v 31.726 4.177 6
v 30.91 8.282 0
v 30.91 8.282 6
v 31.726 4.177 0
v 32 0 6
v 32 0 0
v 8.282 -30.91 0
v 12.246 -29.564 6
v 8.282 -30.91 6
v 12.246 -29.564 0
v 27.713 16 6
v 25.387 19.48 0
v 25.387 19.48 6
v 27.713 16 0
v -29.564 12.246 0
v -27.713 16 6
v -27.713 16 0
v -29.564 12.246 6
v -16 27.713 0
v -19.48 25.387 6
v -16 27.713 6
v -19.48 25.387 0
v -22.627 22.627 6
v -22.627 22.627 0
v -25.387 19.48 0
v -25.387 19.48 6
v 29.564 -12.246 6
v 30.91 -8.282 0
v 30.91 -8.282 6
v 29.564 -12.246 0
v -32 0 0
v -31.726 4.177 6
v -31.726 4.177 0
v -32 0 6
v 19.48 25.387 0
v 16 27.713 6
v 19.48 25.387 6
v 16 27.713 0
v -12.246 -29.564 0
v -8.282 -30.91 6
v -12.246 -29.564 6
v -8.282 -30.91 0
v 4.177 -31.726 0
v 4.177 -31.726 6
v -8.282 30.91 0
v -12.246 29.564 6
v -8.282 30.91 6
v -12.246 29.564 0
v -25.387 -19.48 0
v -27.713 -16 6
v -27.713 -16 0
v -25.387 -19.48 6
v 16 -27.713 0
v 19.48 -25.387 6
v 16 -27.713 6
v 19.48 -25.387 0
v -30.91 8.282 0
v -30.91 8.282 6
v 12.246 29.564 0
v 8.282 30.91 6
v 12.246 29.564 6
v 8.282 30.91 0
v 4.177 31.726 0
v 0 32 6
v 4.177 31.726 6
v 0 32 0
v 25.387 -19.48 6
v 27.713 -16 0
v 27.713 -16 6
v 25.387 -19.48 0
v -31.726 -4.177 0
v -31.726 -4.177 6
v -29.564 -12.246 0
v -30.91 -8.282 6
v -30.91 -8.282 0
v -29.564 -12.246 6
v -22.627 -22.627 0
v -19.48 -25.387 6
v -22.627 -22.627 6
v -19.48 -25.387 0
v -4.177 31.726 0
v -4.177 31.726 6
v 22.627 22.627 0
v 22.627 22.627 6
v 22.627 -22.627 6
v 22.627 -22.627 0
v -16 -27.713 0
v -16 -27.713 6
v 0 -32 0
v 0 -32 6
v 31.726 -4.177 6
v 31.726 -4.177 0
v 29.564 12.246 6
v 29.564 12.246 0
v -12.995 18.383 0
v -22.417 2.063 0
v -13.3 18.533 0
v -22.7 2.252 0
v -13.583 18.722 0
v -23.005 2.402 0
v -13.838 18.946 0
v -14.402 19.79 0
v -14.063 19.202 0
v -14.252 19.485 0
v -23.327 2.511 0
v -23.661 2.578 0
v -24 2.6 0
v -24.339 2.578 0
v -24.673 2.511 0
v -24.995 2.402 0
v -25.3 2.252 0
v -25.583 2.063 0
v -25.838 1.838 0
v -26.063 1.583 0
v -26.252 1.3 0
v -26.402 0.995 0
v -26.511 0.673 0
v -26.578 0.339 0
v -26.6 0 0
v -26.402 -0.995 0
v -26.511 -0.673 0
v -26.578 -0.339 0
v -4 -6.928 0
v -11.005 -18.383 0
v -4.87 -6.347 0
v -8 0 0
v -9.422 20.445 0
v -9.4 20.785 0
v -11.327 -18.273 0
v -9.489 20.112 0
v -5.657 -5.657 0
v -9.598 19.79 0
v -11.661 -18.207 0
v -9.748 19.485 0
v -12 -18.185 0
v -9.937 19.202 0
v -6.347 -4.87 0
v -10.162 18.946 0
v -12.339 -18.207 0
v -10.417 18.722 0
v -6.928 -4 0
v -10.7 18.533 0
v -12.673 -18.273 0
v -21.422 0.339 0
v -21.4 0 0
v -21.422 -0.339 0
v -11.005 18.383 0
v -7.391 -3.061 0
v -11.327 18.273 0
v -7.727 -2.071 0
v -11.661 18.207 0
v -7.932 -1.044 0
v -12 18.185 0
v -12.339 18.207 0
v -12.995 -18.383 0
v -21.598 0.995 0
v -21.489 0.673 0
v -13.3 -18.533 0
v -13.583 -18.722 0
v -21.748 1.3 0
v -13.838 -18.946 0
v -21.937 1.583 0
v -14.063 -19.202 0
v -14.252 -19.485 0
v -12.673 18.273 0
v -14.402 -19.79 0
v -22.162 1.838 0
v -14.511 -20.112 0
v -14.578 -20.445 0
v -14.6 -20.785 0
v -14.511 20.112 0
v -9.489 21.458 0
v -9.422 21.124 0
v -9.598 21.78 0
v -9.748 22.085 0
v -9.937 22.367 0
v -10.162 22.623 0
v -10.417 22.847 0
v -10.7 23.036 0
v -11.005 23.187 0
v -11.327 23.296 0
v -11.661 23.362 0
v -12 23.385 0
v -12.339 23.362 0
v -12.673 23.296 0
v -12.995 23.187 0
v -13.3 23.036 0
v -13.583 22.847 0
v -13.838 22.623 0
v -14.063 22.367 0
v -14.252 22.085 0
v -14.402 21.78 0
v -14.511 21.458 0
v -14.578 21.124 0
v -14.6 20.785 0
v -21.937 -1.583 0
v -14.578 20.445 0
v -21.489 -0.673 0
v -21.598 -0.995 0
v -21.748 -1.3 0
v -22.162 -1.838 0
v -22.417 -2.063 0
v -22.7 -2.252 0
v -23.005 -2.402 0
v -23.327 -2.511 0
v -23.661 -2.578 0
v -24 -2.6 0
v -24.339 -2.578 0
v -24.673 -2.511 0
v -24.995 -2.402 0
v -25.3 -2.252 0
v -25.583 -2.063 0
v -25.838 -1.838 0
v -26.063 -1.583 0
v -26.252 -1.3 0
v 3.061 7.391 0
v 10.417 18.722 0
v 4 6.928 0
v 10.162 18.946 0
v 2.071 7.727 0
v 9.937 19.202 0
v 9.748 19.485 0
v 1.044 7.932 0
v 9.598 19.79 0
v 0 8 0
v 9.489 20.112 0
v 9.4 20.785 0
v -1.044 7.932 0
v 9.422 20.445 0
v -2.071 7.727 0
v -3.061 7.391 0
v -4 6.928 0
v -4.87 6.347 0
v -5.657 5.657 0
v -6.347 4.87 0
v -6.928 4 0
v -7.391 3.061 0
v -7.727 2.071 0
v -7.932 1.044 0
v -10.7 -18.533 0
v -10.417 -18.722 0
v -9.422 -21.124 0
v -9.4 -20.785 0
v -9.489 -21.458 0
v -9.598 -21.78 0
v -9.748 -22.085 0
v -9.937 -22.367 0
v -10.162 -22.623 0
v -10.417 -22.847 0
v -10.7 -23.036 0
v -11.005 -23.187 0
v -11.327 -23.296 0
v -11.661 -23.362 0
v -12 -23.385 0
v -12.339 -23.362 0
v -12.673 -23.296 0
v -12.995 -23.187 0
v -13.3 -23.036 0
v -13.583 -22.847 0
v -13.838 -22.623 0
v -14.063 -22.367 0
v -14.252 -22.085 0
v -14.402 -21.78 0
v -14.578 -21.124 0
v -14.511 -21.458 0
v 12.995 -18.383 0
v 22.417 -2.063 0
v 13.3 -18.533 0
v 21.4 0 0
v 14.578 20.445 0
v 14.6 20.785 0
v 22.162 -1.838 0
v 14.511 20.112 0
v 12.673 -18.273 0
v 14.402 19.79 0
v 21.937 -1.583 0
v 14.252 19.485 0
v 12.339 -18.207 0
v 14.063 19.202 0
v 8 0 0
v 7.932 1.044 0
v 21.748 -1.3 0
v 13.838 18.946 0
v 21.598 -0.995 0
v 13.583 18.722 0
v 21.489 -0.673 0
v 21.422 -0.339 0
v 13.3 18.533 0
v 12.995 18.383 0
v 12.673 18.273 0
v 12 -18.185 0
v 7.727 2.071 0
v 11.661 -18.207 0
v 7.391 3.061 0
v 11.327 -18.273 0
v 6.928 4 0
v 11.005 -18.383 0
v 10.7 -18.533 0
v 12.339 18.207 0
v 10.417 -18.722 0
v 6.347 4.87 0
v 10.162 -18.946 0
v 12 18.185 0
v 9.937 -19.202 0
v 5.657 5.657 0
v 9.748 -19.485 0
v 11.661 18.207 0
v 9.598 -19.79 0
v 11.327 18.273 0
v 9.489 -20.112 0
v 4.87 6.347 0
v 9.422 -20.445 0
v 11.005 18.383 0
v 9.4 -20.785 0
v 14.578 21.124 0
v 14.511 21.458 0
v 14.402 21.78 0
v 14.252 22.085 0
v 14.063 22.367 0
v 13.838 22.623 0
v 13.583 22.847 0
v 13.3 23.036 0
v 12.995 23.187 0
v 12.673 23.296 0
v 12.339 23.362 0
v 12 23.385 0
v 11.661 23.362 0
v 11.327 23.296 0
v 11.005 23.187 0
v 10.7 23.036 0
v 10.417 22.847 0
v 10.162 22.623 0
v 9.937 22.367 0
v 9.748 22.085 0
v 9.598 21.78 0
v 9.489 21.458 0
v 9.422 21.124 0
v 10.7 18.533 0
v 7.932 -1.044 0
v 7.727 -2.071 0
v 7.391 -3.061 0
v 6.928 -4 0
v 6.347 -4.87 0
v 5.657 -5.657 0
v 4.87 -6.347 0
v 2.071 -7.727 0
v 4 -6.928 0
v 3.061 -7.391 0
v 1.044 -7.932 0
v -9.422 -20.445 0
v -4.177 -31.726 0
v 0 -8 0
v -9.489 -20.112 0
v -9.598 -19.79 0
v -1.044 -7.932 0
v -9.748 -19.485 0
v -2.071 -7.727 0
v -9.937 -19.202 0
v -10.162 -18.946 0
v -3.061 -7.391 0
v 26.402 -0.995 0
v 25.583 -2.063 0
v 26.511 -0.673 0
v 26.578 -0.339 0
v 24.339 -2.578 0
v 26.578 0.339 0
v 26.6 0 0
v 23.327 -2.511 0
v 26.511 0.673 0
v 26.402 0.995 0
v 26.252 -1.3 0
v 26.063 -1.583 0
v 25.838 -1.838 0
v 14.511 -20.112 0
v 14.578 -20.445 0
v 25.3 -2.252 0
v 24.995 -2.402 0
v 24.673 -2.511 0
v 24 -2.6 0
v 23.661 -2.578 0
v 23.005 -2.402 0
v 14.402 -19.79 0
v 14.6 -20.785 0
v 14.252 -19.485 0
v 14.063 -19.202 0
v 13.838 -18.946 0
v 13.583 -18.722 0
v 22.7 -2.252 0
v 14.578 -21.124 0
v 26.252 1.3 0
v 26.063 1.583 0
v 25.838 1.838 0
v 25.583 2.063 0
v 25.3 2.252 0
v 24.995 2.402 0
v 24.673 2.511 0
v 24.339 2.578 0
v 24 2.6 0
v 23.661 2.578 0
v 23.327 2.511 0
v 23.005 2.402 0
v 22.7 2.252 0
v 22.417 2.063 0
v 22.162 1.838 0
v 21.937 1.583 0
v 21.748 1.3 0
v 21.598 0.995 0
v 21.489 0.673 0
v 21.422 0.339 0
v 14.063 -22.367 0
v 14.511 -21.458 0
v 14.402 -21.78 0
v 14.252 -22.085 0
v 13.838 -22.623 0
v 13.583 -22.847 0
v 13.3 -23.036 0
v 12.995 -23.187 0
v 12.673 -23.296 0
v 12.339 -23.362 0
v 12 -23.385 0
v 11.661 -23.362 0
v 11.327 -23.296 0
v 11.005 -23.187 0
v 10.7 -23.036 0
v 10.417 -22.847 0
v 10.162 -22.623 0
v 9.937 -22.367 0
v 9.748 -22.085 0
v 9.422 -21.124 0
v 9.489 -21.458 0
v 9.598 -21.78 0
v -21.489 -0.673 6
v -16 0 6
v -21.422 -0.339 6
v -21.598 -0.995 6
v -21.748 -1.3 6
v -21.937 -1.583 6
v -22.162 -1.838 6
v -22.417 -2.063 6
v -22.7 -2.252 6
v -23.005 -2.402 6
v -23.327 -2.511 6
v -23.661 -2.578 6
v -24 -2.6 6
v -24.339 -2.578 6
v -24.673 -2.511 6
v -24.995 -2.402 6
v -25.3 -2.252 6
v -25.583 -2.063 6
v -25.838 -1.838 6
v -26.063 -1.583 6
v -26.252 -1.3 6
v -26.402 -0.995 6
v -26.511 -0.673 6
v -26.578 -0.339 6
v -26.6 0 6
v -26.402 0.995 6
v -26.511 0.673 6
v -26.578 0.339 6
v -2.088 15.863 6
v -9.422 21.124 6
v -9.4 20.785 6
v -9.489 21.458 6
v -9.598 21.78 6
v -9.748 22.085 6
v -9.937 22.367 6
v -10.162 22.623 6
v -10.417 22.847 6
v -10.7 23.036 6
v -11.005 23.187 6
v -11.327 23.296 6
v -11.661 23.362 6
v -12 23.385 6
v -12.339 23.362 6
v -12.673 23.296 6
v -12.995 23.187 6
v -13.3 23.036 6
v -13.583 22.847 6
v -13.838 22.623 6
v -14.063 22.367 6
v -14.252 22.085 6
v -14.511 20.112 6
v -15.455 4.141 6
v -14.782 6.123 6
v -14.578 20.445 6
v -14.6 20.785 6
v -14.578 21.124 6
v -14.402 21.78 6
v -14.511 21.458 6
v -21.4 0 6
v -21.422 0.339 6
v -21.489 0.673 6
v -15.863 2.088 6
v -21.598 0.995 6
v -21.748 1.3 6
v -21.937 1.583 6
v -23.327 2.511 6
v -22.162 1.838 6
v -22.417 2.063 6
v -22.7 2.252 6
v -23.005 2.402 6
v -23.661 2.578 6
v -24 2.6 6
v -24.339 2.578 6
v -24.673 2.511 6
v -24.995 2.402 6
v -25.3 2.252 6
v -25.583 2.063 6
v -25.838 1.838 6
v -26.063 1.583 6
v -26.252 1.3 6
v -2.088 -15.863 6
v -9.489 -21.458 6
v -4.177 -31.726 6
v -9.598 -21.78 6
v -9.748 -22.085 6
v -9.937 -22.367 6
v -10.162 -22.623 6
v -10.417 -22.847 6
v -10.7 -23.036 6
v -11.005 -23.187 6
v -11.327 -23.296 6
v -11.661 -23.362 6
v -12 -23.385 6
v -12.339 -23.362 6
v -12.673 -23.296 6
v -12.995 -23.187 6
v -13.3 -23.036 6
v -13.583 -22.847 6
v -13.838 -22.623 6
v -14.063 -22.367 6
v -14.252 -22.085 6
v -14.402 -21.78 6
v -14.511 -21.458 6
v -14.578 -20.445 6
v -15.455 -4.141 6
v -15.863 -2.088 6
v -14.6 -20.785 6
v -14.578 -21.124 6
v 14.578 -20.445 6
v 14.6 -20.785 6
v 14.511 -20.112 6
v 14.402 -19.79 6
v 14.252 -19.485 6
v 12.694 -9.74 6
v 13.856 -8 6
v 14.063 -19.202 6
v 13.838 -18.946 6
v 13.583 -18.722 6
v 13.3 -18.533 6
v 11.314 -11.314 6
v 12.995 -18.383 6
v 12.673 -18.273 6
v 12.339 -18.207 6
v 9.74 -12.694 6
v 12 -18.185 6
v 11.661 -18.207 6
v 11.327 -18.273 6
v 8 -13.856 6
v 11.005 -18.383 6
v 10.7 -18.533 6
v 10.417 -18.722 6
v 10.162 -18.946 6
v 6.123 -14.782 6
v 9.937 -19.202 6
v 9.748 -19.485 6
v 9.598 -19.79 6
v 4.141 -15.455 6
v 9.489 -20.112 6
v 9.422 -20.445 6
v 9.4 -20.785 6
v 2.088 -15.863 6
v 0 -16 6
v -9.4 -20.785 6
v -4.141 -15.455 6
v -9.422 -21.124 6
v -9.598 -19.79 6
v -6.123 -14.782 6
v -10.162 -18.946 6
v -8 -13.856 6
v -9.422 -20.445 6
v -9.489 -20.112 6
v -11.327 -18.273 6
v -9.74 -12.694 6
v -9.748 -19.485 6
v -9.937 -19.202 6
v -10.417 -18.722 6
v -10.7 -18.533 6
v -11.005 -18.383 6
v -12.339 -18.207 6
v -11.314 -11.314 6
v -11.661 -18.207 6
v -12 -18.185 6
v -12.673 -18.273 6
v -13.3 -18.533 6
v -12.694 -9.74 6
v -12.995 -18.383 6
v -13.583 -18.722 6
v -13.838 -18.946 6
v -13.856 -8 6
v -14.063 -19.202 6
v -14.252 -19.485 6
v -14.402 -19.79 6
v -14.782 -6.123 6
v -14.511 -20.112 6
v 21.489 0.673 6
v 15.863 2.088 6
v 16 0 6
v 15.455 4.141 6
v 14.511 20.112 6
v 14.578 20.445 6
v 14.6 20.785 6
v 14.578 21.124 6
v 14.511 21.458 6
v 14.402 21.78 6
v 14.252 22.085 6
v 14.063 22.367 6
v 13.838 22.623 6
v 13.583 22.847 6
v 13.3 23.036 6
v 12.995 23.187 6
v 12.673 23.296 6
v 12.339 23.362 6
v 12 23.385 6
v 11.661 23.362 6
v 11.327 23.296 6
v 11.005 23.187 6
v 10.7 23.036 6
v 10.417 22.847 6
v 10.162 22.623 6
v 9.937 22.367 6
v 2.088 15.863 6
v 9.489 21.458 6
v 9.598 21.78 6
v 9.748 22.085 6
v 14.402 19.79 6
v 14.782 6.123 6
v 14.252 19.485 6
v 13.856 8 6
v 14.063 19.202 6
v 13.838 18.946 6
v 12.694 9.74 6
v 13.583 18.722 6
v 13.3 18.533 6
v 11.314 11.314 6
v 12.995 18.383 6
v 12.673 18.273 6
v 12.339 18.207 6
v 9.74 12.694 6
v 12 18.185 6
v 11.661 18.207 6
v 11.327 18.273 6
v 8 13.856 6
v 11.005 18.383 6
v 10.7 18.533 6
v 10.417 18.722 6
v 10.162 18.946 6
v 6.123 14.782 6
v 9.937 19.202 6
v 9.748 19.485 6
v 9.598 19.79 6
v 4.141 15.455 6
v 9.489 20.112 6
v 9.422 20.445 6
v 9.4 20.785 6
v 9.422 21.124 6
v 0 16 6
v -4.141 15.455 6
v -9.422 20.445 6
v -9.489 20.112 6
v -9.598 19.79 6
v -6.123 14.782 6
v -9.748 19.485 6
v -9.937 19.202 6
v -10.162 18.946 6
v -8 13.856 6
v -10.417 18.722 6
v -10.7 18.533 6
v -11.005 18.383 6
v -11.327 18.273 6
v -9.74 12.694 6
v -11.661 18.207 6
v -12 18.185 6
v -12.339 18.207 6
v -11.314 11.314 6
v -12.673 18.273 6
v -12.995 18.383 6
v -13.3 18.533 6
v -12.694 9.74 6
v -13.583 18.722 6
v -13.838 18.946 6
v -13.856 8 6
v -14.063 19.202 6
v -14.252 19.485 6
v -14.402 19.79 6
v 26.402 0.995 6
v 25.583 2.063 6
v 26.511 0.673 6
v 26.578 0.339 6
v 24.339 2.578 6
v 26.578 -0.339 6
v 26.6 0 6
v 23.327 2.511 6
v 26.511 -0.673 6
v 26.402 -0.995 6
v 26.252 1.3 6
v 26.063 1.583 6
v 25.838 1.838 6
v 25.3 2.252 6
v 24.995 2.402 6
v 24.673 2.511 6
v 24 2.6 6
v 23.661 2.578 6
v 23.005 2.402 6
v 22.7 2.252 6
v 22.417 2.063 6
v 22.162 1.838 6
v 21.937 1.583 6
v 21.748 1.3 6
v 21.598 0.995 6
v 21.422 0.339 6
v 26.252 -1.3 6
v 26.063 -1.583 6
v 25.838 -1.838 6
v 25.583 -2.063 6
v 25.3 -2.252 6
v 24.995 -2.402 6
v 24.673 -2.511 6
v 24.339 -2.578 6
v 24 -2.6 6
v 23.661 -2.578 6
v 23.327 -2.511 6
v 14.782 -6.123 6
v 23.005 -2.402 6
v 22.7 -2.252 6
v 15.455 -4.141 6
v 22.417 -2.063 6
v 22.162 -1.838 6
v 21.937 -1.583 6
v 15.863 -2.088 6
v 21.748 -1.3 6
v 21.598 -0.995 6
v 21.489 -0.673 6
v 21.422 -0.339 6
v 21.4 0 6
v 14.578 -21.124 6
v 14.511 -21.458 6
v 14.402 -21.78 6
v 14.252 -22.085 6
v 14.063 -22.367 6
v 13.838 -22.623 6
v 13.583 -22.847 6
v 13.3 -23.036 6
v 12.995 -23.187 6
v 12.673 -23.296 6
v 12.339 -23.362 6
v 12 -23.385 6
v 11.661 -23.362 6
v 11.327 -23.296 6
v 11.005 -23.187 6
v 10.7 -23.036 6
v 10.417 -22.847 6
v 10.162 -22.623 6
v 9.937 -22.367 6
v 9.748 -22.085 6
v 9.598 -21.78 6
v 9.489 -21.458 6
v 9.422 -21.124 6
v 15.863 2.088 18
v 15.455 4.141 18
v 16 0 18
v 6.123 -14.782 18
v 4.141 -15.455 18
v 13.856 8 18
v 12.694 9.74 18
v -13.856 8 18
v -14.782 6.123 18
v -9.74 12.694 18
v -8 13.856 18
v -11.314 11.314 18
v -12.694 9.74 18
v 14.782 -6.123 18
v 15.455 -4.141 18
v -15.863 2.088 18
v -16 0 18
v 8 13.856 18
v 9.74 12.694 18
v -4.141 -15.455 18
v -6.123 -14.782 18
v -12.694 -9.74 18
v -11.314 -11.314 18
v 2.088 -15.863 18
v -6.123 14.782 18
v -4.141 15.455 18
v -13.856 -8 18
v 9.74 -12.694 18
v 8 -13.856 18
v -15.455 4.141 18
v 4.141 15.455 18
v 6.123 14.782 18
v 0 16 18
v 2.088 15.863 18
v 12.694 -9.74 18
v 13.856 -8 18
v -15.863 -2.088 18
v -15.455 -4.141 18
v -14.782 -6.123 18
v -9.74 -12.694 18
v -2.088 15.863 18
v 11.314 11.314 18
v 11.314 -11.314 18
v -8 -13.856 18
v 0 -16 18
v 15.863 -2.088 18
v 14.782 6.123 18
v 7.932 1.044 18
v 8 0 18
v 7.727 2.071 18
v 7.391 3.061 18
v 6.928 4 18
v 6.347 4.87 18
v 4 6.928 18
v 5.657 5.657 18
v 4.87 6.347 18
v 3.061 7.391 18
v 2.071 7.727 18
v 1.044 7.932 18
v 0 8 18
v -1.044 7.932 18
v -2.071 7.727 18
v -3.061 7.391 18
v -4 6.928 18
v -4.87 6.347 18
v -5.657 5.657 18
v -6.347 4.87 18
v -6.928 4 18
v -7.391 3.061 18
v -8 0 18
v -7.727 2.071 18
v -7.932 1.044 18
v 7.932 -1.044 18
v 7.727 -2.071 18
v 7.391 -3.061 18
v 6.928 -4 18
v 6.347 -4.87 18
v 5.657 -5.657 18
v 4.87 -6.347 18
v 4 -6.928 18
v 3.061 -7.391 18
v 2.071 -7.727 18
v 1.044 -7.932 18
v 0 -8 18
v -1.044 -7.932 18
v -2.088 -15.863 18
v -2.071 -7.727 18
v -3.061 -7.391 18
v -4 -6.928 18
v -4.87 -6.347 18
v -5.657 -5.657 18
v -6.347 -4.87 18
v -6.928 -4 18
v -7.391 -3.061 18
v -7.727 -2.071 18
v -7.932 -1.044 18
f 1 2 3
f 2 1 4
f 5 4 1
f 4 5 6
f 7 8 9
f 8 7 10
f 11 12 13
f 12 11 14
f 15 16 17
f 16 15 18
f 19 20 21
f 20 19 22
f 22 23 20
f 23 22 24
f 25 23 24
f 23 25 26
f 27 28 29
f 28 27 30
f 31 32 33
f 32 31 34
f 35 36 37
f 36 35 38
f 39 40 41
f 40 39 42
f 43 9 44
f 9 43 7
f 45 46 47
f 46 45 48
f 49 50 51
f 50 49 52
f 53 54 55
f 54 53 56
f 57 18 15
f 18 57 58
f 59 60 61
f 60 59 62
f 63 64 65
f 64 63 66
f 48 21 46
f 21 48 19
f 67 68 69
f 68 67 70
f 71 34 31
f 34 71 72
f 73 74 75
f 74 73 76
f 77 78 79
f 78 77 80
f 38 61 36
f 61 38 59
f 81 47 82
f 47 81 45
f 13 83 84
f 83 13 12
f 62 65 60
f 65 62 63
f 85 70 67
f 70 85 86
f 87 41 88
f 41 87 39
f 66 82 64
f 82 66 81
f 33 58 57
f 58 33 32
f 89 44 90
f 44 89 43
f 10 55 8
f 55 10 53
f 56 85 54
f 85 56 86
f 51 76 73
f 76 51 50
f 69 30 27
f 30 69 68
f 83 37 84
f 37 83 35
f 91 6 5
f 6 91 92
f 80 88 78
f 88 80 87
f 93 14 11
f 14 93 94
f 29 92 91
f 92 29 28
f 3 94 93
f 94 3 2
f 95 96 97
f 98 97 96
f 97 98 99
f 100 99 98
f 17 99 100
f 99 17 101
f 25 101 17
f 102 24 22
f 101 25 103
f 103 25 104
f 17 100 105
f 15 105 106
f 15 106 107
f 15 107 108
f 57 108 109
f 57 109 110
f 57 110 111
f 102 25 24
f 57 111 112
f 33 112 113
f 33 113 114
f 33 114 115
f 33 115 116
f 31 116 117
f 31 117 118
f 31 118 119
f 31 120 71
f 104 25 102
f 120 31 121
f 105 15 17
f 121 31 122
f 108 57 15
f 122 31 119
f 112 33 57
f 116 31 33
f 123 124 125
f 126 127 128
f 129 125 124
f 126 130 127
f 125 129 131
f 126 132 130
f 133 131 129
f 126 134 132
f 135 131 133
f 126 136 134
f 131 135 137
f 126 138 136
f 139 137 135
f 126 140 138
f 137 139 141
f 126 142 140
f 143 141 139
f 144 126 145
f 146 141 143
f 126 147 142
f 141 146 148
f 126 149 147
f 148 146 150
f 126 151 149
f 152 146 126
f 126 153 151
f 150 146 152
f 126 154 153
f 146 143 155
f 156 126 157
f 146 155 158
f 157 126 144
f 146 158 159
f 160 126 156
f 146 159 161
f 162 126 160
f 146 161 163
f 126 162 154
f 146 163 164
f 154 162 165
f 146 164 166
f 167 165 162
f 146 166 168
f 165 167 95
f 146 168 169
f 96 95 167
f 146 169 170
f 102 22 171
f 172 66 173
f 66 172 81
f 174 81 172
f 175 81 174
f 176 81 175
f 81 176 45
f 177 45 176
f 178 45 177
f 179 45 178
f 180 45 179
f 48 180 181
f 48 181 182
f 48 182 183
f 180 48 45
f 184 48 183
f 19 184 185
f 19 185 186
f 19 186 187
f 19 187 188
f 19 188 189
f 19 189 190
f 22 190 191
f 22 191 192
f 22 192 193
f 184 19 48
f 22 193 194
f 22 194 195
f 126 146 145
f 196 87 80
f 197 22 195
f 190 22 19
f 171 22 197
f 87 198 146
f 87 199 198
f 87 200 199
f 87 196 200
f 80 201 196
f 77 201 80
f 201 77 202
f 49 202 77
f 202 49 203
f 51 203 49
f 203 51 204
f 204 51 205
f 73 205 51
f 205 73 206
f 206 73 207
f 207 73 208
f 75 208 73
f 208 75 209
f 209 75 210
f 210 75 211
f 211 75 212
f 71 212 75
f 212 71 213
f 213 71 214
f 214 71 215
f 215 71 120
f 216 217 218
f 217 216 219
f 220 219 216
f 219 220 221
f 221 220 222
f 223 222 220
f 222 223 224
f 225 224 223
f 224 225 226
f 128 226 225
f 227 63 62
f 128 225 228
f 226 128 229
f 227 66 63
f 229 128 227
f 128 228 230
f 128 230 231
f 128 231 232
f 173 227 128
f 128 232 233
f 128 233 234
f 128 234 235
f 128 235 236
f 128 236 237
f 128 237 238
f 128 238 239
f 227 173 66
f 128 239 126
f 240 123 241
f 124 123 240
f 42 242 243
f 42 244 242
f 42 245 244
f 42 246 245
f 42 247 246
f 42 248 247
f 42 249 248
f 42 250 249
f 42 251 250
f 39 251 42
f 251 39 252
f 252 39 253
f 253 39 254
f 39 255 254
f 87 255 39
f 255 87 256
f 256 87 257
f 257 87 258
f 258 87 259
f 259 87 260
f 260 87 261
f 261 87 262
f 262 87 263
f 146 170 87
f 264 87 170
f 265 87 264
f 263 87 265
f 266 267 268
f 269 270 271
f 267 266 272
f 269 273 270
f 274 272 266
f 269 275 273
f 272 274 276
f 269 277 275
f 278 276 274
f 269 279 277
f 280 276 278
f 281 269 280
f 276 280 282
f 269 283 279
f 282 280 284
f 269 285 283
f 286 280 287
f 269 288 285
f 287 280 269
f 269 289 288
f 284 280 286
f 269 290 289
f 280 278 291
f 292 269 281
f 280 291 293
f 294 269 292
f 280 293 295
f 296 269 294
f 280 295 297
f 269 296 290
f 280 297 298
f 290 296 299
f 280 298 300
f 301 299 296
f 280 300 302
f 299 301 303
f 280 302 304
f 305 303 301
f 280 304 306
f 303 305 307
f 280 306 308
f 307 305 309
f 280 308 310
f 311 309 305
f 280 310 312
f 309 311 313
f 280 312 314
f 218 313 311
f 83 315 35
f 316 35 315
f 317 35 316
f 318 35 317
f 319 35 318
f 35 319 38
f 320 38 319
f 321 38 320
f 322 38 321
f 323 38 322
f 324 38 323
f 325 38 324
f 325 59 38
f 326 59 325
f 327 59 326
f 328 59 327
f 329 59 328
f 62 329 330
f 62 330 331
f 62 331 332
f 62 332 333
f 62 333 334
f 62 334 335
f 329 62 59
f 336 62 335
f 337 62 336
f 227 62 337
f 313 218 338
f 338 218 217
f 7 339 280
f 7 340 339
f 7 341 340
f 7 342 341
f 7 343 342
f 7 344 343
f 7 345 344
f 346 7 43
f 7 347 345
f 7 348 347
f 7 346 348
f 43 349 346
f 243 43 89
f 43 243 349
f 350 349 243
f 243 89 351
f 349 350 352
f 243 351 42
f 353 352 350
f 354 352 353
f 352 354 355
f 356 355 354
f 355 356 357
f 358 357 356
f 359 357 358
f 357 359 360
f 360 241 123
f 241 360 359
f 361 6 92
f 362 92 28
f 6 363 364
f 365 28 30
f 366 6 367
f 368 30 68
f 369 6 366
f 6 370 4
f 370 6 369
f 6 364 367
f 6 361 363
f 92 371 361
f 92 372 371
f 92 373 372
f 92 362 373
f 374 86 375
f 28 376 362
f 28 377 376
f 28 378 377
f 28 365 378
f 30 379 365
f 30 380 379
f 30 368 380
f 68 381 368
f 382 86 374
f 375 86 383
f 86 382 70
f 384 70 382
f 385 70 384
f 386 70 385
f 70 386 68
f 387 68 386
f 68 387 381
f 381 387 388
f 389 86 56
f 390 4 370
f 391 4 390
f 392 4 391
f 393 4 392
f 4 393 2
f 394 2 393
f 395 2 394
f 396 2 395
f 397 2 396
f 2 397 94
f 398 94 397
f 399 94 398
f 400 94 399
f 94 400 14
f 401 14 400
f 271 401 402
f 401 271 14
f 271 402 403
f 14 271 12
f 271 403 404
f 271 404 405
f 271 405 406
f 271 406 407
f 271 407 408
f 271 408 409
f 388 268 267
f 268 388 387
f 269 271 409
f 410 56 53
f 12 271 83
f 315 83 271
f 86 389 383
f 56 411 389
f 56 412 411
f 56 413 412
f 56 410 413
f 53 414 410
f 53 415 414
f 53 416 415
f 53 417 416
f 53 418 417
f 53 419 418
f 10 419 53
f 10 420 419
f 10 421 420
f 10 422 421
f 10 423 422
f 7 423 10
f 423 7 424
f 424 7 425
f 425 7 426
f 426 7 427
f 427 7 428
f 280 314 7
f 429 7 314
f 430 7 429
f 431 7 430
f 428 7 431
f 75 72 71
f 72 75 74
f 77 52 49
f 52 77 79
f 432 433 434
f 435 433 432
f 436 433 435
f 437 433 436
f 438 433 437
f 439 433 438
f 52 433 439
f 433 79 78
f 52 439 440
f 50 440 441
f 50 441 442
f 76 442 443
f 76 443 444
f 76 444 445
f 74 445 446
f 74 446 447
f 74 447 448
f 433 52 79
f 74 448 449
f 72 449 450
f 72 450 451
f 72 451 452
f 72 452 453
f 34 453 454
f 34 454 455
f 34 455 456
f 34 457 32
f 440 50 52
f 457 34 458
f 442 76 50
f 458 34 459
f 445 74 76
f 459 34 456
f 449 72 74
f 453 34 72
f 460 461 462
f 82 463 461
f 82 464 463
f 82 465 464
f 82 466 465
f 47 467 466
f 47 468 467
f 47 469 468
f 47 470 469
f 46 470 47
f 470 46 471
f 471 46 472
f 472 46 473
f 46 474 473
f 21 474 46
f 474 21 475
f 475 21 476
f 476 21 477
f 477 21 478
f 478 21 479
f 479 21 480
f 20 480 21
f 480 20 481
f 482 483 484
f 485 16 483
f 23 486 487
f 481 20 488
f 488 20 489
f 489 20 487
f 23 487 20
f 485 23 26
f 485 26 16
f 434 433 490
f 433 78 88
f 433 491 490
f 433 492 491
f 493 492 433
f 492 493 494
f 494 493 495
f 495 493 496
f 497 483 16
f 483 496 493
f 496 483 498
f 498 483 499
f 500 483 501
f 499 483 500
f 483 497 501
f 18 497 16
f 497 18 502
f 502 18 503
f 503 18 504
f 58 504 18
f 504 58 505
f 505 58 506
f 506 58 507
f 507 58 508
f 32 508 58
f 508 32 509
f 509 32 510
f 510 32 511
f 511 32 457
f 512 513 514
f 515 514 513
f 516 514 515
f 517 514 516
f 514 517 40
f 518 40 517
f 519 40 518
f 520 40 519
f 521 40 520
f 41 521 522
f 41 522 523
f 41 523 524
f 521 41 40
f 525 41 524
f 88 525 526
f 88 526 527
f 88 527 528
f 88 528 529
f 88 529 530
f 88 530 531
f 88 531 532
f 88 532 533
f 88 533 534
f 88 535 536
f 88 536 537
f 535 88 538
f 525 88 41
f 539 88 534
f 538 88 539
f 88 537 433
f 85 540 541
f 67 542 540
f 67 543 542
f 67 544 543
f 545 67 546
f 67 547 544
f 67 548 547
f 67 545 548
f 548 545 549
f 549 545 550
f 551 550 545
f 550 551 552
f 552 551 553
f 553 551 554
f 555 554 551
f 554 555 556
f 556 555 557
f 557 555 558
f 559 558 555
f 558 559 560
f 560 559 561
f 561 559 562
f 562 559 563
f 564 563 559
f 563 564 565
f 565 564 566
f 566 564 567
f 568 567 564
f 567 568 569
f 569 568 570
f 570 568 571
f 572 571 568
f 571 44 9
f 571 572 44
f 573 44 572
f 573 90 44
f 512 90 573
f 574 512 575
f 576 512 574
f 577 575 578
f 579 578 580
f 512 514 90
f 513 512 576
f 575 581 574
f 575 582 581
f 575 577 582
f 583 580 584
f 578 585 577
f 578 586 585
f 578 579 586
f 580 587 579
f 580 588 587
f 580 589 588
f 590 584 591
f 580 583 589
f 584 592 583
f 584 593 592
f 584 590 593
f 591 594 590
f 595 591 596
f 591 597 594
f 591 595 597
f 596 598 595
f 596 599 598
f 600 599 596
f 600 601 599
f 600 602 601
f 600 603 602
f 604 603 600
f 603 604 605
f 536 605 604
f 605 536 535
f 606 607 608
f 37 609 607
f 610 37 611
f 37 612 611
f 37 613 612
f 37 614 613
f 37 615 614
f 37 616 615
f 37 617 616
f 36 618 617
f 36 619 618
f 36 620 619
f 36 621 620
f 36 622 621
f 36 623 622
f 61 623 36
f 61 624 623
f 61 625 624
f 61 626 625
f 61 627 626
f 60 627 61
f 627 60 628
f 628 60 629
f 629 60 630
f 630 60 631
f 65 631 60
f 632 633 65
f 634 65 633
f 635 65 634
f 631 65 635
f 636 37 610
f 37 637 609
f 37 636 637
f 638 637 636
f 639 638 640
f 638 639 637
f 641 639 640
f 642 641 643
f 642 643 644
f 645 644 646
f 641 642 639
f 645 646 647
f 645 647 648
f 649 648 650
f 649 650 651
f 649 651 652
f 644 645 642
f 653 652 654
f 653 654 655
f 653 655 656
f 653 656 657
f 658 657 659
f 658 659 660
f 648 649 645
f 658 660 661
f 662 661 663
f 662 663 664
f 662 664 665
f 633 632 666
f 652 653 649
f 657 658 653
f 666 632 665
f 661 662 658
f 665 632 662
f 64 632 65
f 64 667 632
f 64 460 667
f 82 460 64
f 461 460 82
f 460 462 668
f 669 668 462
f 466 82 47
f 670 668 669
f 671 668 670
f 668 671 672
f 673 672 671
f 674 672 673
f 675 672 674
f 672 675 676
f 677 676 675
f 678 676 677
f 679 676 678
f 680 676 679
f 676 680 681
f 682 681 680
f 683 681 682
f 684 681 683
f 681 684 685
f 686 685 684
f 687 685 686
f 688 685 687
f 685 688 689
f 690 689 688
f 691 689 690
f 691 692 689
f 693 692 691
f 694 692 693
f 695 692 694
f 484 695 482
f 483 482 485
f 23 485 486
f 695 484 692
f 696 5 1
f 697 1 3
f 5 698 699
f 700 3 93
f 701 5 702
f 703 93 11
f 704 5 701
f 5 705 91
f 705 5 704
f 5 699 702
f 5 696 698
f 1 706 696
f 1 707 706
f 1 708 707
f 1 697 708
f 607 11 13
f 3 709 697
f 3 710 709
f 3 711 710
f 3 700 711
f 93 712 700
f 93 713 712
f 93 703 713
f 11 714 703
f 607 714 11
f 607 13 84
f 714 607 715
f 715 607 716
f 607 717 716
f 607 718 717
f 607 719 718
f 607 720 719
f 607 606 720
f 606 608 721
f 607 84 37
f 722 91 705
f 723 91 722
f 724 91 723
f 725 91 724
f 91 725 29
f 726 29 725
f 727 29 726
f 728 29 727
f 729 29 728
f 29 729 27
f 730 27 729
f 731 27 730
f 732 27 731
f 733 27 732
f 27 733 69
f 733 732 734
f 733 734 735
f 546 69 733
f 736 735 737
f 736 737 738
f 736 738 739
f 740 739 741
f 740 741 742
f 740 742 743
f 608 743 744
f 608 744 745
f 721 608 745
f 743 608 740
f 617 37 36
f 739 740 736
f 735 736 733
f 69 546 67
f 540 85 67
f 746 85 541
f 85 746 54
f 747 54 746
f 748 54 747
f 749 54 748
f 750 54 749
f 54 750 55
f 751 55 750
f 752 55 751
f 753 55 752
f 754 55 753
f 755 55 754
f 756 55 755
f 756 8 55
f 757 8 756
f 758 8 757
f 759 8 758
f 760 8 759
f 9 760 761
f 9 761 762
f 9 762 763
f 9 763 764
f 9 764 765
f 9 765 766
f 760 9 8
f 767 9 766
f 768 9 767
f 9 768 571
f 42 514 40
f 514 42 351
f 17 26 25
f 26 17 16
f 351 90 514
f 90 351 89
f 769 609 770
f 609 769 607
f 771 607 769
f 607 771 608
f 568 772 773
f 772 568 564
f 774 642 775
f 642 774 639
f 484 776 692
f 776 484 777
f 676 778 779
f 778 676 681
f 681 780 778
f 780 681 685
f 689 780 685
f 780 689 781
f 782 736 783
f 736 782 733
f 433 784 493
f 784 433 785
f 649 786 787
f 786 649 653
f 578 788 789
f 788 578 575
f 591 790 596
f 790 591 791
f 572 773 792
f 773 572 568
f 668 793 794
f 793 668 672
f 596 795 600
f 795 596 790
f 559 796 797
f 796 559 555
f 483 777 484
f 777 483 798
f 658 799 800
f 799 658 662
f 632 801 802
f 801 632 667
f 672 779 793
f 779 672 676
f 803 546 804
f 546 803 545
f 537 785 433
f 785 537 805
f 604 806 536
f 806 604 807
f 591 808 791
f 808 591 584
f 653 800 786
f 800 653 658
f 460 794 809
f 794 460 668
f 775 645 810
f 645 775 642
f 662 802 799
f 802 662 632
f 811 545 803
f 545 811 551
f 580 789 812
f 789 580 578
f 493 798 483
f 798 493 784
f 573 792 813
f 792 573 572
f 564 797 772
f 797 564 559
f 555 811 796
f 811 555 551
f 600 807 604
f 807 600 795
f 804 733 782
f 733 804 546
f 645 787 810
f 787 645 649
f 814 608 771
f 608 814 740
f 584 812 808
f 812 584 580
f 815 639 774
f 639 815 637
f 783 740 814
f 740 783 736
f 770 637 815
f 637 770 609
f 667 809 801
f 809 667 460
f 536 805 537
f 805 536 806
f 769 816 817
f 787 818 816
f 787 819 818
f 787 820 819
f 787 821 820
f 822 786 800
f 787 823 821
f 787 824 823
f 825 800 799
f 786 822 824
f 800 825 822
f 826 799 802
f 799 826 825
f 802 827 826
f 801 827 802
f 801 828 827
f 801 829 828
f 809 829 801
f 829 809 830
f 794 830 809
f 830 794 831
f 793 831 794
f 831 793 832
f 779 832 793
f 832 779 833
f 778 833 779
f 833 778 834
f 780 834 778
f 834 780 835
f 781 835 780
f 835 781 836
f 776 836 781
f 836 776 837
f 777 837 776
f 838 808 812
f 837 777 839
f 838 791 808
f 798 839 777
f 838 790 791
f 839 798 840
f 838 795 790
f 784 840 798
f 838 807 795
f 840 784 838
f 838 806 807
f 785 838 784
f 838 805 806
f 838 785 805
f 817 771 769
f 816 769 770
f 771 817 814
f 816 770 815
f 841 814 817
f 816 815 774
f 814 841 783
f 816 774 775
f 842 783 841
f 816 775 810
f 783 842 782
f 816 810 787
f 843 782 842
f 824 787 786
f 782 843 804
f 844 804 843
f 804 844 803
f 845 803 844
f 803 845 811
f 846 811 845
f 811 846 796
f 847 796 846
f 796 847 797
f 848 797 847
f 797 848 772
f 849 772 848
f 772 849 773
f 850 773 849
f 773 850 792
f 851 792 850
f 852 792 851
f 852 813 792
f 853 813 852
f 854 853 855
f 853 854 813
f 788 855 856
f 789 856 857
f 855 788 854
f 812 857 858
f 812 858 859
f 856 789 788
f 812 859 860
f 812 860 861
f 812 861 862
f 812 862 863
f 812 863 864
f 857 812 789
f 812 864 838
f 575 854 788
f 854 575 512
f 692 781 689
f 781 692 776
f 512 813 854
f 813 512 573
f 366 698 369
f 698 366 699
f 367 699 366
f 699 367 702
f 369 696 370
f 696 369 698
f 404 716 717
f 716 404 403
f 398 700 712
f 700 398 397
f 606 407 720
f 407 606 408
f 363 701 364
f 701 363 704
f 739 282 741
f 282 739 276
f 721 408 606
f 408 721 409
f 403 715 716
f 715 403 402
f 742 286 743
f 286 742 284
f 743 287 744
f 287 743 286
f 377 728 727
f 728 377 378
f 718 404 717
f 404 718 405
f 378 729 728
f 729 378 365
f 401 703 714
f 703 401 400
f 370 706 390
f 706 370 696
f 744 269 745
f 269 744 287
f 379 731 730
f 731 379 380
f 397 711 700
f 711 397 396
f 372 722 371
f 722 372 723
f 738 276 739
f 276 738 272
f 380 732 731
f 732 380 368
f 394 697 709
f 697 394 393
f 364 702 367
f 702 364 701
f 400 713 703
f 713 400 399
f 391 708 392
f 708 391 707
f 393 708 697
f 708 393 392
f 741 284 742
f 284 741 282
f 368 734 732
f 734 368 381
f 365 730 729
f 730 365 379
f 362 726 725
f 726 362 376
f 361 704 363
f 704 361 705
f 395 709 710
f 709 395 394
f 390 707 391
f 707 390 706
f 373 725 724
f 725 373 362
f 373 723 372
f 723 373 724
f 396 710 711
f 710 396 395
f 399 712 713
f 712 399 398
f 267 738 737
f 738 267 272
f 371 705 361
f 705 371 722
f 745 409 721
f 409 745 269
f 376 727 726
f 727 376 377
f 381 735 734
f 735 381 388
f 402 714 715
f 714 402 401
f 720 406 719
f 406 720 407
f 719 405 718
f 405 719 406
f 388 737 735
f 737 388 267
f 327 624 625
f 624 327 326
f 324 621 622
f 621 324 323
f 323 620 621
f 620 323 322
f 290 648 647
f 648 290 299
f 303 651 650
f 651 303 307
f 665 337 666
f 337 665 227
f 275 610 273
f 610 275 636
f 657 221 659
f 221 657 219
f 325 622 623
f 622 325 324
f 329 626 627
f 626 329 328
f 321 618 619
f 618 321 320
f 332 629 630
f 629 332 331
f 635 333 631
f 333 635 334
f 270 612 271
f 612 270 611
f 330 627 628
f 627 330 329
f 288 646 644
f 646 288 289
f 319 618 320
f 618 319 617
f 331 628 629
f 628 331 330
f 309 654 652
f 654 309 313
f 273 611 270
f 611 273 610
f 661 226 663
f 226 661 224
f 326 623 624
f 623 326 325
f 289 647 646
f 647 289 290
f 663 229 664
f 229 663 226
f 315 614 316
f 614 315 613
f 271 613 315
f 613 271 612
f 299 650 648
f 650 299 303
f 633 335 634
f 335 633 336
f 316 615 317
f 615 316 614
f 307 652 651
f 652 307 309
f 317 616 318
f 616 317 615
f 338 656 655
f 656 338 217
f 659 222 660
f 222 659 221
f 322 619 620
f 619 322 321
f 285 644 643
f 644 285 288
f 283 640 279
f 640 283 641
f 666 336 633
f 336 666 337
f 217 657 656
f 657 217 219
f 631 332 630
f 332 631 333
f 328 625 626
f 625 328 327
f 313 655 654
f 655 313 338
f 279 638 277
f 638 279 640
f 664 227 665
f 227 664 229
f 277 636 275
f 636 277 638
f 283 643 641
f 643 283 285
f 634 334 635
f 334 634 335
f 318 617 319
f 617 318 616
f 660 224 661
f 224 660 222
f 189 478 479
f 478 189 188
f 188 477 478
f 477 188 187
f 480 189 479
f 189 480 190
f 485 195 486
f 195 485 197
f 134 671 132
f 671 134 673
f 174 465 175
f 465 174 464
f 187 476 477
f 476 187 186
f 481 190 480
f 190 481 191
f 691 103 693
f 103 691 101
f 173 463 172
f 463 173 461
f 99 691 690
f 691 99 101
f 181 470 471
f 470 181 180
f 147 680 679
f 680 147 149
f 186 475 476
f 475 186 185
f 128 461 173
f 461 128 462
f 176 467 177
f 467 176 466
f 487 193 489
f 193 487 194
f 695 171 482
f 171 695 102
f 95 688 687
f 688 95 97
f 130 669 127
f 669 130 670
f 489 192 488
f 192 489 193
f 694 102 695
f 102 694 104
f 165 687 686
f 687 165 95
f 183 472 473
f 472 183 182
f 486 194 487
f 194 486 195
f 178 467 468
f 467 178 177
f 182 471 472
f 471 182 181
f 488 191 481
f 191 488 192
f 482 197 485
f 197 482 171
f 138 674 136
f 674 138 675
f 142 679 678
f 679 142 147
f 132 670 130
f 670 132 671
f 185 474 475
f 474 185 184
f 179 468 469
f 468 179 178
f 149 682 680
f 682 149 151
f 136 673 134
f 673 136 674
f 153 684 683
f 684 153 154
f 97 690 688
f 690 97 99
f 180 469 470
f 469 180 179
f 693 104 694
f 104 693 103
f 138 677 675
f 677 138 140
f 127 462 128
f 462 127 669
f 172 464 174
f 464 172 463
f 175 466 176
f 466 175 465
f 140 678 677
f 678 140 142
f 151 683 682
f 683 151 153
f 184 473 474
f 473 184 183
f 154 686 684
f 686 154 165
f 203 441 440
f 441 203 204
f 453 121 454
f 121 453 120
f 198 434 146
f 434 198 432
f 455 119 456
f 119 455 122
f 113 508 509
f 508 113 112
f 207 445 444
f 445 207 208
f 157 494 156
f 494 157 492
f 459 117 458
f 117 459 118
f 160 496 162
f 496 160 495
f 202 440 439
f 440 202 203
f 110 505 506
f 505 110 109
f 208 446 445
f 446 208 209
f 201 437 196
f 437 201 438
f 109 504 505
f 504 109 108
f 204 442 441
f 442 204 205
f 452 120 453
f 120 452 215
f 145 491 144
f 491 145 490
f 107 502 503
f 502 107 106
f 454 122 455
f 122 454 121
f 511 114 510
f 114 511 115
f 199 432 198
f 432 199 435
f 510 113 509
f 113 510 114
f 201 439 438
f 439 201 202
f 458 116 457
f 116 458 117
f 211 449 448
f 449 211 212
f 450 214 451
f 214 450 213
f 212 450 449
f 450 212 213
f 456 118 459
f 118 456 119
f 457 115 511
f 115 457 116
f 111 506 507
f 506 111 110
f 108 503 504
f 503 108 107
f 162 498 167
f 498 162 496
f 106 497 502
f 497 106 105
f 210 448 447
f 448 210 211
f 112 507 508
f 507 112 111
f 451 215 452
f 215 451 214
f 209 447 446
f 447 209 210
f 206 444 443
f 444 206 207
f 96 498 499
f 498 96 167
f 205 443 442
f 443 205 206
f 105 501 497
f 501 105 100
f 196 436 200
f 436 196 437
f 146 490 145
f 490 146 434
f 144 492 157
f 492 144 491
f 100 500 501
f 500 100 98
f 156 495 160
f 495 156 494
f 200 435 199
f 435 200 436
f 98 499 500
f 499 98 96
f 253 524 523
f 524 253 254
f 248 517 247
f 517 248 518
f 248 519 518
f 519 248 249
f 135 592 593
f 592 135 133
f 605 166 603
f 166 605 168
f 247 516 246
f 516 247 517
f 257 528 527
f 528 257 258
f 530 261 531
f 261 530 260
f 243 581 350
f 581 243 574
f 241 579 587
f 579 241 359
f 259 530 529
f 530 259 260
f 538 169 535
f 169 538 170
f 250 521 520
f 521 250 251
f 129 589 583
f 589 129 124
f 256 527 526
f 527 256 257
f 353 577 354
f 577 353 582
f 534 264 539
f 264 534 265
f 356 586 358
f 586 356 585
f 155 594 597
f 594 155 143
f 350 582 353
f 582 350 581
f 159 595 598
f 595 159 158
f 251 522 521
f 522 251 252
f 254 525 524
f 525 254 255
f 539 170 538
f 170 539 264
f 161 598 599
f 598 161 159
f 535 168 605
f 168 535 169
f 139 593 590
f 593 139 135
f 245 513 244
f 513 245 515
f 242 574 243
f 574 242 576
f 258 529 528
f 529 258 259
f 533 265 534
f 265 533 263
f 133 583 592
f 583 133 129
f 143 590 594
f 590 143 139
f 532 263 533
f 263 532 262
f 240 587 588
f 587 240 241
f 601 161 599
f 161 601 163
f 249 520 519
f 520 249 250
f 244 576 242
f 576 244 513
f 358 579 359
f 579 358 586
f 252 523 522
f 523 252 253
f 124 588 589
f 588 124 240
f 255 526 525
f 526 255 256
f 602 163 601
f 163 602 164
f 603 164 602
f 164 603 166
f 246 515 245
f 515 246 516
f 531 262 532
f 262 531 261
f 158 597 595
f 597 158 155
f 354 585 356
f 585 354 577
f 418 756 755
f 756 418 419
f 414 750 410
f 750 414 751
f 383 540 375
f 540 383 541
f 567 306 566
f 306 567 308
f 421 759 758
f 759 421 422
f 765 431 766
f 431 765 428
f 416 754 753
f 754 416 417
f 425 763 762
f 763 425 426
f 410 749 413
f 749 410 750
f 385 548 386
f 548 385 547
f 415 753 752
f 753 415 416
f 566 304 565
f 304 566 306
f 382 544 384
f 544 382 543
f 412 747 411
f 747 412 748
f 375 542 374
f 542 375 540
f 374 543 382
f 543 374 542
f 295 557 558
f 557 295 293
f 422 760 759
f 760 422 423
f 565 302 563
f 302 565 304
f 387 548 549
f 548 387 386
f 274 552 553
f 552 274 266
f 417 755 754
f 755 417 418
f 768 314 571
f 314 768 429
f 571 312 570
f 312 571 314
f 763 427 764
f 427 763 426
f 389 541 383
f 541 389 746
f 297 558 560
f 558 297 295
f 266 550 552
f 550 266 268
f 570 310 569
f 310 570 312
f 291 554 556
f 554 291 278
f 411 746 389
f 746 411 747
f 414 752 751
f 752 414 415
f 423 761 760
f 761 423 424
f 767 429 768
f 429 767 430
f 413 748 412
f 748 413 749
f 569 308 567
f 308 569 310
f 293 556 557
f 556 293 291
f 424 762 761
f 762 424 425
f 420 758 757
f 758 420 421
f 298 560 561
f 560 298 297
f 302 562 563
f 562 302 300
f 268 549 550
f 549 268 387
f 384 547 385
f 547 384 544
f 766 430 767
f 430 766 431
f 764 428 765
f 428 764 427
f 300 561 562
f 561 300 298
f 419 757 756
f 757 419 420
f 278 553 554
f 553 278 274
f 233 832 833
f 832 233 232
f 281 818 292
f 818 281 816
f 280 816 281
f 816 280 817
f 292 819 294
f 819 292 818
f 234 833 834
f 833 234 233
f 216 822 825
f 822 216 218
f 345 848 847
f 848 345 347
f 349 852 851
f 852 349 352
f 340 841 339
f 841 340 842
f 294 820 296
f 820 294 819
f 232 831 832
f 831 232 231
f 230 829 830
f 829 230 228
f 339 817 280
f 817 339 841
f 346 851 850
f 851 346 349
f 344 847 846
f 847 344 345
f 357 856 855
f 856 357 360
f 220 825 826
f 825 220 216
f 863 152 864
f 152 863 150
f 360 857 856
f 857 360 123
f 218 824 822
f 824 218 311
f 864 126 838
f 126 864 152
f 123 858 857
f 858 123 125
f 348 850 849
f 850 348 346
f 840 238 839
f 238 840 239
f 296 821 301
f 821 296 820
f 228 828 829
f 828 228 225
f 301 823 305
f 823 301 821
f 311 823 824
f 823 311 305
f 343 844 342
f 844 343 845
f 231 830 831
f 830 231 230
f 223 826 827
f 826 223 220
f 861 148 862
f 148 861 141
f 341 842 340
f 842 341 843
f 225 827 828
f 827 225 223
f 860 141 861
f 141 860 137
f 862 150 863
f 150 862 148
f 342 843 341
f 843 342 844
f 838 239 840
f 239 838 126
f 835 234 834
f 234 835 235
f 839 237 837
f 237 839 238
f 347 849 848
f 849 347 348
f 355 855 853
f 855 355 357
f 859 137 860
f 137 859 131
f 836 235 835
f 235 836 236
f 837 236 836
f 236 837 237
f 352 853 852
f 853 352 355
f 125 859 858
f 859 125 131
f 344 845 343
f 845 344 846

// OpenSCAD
// Parametric Flanged Shaft Hub (mm)
$fn = 48;

flange_r = 32;
flange_h = 6;
boss_r = 16;
boss_h = 18;
bore_r = 8;
bolt_circle_r = 24;
bolt_hole_r = 2.6;
bolt_count = 6;

module flanged_hub() {
  difference() {
    union() {
      cylinder(r = flange_r, h = flange_h);
      cylinder(r = boss_r, h = boss_h);
    }
    translate([0, 0, -1])
      cylinder(r = bore_r, h = boss_h + 2);
    for (i = [0 : bolt_count - 1]) {
      angle = i * 360 / bolt_count;
      rotate([0, 0, angle])
        translate([bolt_circle_r, 0, -1])
          cylinder(r = bolt_hole_r, h = flange_h + 2);
    }
  }
}

flanged_hub();
